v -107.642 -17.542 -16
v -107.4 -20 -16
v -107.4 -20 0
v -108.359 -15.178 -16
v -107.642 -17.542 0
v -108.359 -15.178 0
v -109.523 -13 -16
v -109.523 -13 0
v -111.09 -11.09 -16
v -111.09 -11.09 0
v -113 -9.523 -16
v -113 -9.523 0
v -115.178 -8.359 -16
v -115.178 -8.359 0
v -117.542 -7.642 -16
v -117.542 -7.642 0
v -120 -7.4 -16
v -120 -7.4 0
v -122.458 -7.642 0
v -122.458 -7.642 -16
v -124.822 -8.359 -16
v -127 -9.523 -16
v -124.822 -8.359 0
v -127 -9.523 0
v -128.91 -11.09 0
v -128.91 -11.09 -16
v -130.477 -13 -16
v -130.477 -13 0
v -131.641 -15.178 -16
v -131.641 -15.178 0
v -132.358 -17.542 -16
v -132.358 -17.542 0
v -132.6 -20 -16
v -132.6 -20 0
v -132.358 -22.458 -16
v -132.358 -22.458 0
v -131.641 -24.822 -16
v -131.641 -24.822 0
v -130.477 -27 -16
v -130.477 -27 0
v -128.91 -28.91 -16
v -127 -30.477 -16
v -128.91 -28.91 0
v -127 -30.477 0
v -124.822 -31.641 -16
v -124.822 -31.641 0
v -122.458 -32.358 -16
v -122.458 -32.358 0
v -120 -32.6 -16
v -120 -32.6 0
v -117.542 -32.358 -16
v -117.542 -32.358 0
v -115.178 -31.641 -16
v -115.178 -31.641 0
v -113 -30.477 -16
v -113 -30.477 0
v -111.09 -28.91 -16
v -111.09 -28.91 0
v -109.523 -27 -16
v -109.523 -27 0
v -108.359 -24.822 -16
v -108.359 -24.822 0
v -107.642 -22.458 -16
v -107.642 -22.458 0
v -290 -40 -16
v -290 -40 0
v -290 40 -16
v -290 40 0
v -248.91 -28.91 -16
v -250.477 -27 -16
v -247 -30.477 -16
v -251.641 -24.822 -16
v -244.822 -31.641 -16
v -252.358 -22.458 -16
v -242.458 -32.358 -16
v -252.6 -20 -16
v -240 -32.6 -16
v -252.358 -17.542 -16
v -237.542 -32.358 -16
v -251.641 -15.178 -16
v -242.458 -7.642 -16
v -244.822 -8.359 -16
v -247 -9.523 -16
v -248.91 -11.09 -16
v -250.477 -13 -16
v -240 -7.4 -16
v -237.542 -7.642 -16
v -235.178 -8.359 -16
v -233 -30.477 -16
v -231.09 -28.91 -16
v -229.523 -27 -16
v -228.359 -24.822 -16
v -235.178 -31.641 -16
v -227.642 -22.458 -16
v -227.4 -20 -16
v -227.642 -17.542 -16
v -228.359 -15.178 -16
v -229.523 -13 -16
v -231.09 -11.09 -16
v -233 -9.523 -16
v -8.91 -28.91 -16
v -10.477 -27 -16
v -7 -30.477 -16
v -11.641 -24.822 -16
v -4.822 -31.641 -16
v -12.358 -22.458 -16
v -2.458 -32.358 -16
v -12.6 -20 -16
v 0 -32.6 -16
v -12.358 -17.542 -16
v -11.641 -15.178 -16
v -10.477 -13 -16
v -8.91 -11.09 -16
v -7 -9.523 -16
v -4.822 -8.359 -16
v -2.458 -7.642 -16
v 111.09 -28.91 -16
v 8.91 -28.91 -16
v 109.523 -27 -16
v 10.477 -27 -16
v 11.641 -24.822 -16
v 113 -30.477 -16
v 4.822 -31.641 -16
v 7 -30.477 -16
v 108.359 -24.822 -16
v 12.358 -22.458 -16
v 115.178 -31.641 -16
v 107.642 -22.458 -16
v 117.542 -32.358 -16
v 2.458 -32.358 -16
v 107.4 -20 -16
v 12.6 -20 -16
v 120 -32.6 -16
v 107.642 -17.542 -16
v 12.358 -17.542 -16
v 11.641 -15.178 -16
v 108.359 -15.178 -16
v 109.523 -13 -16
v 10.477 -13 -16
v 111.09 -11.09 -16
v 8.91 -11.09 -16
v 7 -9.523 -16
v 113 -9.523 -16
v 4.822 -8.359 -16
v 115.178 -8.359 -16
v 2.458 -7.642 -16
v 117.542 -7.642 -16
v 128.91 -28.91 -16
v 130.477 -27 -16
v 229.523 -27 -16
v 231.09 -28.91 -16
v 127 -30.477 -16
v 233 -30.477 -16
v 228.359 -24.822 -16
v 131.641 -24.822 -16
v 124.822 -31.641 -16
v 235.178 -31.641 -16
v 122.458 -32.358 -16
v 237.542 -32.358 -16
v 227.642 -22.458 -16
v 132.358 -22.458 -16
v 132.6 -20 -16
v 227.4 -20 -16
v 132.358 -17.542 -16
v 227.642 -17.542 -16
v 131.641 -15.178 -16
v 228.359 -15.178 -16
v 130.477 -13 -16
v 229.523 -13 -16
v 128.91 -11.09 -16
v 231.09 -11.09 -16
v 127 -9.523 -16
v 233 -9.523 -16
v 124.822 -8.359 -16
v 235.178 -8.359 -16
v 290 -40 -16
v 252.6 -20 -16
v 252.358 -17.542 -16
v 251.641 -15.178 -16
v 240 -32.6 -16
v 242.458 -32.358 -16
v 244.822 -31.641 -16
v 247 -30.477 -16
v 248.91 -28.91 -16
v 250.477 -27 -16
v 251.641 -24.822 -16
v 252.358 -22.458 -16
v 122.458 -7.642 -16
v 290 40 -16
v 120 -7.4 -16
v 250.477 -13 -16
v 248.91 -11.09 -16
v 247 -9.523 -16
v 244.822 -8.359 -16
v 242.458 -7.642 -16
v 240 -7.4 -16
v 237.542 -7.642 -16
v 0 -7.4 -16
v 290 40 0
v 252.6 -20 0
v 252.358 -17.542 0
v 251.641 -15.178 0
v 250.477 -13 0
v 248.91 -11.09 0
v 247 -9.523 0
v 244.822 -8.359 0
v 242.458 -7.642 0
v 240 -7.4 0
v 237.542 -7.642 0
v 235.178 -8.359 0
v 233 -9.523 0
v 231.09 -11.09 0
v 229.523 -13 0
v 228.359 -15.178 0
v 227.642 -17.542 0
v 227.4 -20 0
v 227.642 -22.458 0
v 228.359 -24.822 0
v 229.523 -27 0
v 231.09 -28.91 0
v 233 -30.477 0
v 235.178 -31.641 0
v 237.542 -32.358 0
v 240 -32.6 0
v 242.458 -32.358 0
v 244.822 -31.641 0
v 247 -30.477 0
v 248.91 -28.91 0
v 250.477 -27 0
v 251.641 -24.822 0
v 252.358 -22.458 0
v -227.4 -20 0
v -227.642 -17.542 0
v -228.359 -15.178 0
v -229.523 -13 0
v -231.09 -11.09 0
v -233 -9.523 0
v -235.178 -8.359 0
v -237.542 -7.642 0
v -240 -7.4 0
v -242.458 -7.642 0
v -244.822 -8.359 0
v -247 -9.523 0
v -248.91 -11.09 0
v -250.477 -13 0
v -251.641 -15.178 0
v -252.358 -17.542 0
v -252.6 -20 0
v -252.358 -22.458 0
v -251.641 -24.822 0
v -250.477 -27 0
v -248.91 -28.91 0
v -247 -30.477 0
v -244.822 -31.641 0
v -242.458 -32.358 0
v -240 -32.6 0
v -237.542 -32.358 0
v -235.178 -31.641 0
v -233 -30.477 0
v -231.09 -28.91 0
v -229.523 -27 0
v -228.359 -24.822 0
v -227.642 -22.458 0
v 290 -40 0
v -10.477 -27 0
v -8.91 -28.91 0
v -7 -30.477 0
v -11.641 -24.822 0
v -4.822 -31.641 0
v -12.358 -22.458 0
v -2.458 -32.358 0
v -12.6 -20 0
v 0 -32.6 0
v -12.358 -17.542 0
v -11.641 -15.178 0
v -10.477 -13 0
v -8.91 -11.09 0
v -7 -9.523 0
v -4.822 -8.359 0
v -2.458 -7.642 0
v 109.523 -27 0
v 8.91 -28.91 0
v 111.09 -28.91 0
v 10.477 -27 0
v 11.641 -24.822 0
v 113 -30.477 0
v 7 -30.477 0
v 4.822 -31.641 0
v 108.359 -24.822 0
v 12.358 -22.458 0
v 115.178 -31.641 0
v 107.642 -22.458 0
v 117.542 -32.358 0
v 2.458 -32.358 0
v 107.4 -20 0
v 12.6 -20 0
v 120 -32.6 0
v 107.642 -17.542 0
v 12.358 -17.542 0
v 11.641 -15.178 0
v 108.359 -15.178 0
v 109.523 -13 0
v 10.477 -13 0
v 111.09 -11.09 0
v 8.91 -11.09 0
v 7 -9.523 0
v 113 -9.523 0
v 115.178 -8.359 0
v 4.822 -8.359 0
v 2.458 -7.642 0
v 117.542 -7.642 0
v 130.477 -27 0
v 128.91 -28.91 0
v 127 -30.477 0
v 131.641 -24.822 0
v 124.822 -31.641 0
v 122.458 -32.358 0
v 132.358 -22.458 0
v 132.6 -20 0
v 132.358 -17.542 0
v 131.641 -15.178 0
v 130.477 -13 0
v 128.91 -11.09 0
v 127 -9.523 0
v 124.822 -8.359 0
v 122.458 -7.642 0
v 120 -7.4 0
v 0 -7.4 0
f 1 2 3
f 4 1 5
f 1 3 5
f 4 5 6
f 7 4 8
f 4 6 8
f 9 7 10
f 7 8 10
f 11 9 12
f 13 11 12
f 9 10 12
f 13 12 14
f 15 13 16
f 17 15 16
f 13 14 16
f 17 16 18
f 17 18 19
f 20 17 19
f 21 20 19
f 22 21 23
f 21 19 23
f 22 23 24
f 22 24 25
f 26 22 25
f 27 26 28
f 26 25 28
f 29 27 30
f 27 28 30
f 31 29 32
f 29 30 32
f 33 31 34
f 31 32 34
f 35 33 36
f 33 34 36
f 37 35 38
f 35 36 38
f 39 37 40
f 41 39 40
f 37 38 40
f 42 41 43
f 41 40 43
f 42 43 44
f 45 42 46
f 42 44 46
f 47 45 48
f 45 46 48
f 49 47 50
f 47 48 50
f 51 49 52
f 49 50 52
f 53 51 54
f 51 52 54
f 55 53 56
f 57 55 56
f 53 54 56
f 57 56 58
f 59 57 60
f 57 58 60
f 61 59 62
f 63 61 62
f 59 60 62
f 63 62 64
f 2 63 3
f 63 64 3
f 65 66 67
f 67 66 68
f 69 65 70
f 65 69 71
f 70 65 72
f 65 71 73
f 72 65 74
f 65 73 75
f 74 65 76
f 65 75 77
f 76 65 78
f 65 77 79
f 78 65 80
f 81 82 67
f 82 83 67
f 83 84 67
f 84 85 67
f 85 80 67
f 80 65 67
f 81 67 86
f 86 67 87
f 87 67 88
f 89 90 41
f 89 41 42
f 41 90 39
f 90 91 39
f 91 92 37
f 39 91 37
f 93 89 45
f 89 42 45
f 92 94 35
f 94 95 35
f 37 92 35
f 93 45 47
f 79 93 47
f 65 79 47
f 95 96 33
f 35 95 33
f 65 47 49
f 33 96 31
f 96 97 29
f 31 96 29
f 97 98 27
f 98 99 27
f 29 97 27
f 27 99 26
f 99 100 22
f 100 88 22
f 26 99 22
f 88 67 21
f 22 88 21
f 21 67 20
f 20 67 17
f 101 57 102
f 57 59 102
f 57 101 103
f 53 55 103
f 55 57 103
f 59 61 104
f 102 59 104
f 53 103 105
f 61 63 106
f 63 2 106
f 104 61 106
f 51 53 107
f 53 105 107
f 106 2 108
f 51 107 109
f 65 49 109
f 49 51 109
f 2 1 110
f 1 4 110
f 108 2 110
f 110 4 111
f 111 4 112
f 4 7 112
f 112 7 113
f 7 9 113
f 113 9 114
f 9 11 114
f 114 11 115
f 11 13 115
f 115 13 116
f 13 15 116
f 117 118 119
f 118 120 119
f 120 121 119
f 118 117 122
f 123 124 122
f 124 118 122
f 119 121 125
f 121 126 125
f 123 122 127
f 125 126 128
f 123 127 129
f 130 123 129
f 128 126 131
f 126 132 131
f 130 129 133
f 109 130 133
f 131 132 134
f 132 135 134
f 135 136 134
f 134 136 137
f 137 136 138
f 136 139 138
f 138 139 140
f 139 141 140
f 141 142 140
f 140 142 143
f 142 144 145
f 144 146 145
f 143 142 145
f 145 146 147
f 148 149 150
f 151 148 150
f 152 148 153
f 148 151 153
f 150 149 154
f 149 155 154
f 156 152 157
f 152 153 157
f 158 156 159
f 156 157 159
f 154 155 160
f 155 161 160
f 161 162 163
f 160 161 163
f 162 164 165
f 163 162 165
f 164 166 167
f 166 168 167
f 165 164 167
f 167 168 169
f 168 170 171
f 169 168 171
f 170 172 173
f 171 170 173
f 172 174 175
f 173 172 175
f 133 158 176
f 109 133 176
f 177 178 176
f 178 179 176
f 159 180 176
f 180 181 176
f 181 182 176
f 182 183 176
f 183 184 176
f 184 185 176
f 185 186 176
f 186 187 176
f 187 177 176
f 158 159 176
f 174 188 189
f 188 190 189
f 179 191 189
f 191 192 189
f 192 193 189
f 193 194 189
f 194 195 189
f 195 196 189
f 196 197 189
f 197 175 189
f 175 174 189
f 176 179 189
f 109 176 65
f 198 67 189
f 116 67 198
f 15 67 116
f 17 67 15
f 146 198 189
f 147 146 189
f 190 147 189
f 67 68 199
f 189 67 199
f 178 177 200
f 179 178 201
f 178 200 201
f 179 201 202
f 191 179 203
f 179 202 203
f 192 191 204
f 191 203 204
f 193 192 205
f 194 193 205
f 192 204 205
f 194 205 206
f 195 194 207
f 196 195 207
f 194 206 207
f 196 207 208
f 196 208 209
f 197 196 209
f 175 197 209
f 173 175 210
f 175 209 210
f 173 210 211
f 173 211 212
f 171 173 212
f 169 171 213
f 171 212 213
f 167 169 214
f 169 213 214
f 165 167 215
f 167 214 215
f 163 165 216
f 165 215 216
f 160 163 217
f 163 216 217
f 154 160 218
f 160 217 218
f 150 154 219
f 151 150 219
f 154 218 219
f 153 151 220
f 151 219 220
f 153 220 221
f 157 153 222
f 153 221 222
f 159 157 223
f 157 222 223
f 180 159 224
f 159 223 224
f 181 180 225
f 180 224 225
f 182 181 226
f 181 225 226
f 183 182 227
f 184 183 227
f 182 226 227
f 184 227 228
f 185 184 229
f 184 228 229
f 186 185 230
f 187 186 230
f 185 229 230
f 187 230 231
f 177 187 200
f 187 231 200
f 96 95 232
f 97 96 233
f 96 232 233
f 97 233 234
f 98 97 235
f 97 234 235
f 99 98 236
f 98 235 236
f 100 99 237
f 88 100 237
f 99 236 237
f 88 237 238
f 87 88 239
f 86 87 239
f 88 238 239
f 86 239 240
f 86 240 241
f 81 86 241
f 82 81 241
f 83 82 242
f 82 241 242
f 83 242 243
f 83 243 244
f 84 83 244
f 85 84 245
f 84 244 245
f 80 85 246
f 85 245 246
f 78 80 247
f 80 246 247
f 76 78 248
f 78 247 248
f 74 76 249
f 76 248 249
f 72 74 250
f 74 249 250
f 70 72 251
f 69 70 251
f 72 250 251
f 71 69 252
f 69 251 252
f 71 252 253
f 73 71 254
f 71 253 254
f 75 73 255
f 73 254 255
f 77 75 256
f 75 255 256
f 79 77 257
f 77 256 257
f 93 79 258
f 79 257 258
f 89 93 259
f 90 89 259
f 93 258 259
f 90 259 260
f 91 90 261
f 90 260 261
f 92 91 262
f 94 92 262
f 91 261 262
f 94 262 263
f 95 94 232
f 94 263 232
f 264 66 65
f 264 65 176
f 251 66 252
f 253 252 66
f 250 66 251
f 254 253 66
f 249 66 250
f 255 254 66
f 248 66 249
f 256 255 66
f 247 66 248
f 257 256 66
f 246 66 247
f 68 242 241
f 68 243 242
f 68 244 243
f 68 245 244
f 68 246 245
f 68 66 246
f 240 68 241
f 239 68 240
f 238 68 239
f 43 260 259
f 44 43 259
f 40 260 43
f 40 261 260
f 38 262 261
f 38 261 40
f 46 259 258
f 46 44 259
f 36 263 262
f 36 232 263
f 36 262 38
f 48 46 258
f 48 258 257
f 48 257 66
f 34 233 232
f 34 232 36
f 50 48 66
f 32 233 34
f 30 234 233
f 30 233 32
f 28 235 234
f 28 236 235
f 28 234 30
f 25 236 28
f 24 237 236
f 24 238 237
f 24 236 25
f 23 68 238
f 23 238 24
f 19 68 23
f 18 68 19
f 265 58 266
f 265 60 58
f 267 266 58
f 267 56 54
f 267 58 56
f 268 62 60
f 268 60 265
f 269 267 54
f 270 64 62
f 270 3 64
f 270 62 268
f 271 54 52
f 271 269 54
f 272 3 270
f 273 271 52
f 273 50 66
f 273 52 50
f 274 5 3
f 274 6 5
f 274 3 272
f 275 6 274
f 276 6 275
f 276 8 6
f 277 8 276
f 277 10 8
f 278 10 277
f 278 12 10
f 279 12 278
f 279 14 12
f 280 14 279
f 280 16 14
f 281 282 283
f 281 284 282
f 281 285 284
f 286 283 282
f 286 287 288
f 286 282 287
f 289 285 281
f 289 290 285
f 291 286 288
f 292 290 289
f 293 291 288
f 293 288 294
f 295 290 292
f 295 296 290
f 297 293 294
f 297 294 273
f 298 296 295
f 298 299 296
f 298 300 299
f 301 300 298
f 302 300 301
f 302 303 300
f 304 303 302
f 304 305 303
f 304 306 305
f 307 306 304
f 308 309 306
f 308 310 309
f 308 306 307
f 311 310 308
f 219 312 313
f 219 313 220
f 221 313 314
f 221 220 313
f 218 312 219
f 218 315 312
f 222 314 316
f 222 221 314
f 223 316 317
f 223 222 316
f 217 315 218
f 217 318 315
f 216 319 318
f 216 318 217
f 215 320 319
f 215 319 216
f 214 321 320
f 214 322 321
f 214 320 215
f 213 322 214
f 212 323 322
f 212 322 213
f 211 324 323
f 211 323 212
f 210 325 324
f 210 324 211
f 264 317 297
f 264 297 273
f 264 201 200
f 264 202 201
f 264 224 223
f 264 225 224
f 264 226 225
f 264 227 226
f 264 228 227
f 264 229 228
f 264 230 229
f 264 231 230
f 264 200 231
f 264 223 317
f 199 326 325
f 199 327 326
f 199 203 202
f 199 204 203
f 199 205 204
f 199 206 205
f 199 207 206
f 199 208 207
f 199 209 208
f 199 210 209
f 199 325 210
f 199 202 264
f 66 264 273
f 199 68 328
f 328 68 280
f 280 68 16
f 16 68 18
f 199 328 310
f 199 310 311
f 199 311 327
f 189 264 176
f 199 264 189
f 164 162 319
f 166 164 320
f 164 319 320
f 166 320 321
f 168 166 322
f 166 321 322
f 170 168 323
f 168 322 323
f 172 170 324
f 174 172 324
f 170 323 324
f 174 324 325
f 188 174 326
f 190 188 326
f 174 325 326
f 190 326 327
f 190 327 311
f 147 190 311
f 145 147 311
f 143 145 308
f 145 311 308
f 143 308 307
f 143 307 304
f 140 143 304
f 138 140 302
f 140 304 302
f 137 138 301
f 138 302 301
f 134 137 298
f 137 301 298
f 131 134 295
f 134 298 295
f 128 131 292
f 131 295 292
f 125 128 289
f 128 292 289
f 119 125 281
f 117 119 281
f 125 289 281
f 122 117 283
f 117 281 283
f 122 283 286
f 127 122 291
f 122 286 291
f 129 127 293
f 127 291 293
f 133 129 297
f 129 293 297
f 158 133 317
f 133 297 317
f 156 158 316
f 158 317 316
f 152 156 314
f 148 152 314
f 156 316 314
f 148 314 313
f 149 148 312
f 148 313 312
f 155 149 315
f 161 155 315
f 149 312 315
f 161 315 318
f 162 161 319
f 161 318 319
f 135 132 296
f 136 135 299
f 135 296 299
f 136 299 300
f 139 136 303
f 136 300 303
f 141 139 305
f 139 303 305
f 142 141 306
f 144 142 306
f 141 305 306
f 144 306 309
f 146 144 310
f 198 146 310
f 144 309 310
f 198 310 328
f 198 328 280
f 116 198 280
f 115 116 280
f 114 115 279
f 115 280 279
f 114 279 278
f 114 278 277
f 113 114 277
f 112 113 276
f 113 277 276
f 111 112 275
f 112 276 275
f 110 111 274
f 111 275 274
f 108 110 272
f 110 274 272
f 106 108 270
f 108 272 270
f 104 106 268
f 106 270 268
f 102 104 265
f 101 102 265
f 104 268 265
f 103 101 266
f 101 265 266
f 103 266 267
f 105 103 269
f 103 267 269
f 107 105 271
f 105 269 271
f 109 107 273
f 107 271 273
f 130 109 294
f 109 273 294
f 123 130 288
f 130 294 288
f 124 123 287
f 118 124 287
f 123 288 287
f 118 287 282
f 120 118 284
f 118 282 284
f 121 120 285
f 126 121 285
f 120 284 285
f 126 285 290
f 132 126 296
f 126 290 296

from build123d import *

# Parameters (mm, degrees)
CROQUIS1_W              = 580
CROQUIS1_H              = 80
CROQUIS1_R              = 12.6
SALIENTE_EXTRUIR1_DEPTH = 16


with BuildPart() as part:
    # Croquis1 → Saliente-Extruir1 (new body)
    with BuildSketch(Plane.XY):
        Rectangle(CROQUIS1_W, CROQUIS1_H)
        with Locations((-240, -20)):
            Circle(CROQUIS1_R, mode=Mode.SUBTRACT)
        with Locations((-120, -20)):
            Circle(CROQUIS1_R, mode=Mode.SUBTRACT)
        with Locations((0, -20)):
            Circle(CROQUIS1_R, mode=Mode.SUBTRACT)
        with Locations((120, -20)):
            Circle(CROQUIS1_R, mode=Mode.SUBTRACT)
        with Locations((240, -20)):
            Circle(CROQUIS1_R, mode=Mode.SUBTRACT)
    extrude(amount=-SALIENTE_EXTRUIR1_DEPTH)


solid = part.part
